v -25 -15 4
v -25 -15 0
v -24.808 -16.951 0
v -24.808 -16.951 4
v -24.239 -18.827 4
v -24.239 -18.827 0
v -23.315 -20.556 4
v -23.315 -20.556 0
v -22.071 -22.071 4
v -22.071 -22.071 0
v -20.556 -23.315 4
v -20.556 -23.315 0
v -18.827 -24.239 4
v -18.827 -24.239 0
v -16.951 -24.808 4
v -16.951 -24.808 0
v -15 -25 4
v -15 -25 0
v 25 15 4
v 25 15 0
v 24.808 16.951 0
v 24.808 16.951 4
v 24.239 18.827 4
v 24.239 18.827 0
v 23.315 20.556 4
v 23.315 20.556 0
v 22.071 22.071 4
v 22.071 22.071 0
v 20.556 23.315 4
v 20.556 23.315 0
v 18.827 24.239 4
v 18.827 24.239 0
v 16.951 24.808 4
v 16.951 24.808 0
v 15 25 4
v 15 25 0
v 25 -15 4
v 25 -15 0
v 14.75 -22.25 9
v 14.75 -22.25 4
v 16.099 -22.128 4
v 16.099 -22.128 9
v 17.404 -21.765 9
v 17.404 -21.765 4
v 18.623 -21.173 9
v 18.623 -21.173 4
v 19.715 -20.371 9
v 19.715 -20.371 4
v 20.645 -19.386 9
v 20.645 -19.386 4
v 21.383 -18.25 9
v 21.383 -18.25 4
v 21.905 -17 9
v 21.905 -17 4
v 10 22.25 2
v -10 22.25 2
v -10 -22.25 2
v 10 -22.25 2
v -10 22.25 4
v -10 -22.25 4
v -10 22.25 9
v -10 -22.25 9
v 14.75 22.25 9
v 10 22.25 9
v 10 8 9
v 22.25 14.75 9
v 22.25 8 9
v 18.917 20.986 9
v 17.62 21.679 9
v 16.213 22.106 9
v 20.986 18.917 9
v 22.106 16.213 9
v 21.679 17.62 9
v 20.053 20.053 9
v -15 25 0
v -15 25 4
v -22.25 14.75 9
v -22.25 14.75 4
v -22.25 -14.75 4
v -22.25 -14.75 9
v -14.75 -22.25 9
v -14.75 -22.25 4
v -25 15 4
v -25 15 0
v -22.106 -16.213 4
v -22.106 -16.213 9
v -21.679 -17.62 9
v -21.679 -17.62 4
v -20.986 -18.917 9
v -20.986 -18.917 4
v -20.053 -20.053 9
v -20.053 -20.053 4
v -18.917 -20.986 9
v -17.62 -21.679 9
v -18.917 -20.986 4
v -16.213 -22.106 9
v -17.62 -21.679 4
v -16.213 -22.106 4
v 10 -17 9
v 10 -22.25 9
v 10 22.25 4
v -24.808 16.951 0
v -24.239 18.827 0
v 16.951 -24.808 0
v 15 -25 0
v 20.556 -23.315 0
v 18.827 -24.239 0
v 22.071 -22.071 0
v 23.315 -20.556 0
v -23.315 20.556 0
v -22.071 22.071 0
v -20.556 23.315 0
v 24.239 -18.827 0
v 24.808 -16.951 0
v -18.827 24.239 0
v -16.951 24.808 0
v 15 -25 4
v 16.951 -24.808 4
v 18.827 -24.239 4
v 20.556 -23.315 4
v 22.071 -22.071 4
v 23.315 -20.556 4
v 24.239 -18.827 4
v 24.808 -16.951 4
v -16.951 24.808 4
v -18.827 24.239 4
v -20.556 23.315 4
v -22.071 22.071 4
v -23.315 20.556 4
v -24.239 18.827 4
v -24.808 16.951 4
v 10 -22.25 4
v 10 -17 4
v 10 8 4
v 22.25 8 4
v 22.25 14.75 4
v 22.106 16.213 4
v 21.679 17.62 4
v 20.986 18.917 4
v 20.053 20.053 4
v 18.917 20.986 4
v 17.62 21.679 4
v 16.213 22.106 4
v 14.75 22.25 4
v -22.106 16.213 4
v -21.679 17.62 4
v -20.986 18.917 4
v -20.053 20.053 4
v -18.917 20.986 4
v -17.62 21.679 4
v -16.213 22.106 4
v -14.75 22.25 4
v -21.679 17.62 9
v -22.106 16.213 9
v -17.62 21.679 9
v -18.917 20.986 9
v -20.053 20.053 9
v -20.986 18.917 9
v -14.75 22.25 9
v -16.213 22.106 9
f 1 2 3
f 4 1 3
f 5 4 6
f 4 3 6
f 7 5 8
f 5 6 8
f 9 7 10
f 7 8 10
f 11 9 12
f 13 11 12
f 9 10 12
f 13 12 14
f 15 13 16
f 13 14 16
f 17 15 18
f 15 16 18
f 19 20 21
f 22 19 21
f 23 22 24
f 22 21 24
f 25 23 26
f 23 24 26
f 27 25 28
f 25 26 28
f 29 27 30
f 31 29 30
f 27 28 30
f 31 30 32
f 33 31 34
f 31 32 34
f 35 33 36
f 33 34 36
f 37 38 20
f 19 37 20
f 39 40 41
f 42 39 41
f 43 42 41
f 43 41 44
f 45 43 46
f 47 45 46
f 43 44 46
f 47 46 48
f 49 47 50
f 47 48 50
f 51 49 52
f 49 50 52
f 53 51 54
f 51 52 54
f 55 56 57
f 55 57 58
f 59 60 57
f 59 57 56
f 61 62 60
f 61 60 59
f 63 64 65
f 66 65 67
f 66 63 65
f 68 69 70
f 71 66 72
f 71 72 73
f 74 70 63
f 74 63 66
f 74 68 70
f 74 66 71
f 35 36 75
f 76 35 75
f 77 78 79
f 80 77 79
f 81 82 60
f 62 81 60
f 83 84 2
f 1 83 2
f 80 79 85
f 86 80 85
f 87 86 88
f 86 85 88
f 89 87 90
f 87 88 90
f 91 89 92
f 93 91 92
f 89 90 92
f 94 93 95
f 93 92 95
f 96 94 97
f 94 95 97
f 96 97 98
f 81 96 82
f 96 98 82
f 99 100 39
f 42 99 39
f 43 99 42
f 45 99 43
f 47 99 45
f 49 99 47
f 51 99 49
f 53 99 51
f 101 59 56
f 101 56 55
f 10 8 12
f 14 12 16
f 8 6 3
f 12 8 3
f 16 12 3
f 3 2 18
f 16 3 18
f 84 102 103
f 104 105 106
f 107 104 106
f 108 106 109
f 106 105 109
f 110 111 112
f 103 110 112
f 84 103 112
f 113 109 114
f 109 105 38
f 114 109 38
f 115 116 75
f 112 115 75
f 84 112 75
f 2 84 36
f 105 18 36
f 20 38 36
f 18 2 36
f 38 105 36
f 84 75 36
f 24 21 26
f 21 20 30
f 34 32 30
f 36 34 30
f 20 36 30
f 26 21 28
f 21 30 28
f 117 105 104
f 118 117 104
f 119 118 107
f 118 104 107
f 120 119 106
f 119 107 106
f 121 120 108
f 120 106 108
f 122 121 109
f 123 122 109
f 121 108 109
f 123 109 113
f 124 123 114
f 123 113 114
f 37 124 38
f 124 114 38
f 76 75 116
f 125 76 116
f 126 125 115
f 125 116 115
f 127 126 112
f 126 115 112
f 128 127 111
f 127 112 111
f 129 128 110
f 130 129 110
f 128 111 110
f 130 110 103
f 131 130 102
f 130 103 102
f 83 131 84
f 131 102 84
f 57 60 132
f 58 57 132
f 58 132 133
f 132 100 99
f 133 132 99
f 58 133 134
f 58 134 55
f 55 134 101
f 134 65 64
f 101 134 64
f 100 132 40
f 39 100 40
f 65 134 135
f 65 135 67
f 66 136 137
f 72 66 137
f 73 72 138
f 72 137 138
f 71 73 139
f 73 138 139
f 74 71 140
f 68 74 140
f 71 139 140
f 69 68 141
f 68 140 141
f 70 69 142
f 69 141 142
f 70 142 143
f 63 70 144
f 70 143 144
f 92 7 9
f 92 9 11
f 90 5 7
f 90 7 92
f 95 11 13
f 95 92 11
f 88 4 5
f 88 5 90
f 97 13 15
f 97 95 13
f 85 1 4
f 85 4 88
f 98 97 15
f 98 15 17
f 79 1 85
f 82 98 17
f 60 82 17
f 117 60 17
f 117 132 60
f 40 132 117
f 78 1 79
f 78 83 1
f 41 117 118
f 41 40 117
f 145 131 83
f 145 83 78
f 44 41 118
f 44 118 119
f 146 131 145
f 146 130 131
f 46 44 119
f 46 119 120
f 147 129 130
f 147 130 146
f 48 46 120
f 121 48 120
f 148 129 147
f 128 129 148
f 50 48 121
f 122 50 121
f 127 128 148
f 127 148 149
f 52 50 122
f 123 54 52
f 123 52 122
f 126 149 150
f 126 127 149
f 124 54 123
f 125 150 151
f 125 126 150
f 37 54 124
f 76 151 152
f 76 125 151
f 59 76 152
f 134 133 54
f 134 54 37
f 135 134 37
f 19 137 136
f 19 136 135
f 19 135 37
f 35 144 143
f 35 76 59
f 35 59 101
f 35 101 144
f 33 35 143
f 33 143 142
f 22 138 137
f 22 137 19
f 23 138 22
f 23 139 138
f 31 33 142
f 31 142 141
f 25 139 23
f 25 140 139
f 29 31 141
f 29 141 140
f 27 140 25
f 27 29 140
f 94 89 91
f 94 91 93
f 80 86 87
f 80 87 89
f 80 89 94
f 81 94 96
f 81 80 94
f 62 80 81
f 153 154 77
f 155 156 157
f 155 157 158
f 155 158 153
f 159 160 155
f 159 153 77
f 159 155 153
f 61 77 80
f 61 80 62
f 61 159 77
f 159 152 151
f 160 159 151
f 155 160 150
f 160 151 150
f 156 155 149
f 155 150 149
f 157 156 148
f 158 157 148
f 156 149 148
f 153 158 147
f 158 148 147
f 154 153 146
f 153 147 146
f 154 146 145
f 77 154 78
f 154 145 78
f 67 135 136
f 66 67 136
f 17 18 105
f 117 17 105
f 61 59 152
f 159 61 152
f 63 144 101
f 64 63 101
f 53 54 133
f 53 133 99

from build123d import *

# Parameters (mm, degrees)
F1_DEPTH = 4
F3_DEPTH = 5
F4_W     = 20
F4_H     = 44.5
F5_DEPTH = 7
F6_W     = 25
F6_H     = 5
F7_DEPTH = 13


with BuildPart() as f1:
    # F0 (on Top) → F1 (new body)
    with BuildSketch(Plane.XY):
        with BuildLine():
            ThreePointArc((25, 15), (22.071068, 22.071068), (15, 25))
            Line((15, 25), (-15, 25))
            ThreePointArc((-15, 25), (-22.071068, 22.071068), (-25, 15))
            Line((-25, 15), (-25, -15))
            ThreePointArc((-25, -15), (-22.071068, -22.071068), (-15, -25))
            Line((-15, -25), (15, -25))
            ThreePointArc((15, -25), (22.071068, -22.071068), (25, -15))
            Line((25, -15), (25, 15))
        make_face()
    extrude(amount=F1_DEPTH)

    # F2 (on face) → F3 (join)
    with BuildSketch(Plane.XY.offset(4)):
        with BuildLine():
            ThreePointArc((22.25, 14.75), (20.053301, 20.053301), (14.75, 22.25))
            Line((14.75, 22.25), (-14.75, 22.25))
            ThreePointArc((-14.75, 22.25), (-20.053301, 20.053301), (-22.25, 14.75))
            Line((-22.25, 14.75), (-22.25, -14.75))
            ThreePointArc((-22.25, -14.75), (-20.053301, -20.053301), (-14.75, -22.25))
            Line((-14.75, -22.25), (14.75, -22.25))
            ThreePointArc((14.75, -22.25), (20.053301, -20.053301), (22.25, -14.75))
            Line((22.25, -14.75), (22.25, 14.75))
        make_face()
    extrude(amount=F3_DEPTH)

    # F4 (on face) → F5 (cut)
    with BuildSketch(Plane.XY.offset(9)):
        Rectangle(F4_W, F4_H)
    extrude(amount=-F5_DEPTH, mode=Mode.SUBTRACT)

    # F6 (on face) → F7 (cut)
    with BuildSketch(Plane.YZ.offset(22.25)):
        with Locations((-4.5, 6.5)):
            Rectangle(F6_W, F6_H)
    extrude(amount=-F7_DEPTH, mode=Mode.SUBTRACT)


solid = f1.part
